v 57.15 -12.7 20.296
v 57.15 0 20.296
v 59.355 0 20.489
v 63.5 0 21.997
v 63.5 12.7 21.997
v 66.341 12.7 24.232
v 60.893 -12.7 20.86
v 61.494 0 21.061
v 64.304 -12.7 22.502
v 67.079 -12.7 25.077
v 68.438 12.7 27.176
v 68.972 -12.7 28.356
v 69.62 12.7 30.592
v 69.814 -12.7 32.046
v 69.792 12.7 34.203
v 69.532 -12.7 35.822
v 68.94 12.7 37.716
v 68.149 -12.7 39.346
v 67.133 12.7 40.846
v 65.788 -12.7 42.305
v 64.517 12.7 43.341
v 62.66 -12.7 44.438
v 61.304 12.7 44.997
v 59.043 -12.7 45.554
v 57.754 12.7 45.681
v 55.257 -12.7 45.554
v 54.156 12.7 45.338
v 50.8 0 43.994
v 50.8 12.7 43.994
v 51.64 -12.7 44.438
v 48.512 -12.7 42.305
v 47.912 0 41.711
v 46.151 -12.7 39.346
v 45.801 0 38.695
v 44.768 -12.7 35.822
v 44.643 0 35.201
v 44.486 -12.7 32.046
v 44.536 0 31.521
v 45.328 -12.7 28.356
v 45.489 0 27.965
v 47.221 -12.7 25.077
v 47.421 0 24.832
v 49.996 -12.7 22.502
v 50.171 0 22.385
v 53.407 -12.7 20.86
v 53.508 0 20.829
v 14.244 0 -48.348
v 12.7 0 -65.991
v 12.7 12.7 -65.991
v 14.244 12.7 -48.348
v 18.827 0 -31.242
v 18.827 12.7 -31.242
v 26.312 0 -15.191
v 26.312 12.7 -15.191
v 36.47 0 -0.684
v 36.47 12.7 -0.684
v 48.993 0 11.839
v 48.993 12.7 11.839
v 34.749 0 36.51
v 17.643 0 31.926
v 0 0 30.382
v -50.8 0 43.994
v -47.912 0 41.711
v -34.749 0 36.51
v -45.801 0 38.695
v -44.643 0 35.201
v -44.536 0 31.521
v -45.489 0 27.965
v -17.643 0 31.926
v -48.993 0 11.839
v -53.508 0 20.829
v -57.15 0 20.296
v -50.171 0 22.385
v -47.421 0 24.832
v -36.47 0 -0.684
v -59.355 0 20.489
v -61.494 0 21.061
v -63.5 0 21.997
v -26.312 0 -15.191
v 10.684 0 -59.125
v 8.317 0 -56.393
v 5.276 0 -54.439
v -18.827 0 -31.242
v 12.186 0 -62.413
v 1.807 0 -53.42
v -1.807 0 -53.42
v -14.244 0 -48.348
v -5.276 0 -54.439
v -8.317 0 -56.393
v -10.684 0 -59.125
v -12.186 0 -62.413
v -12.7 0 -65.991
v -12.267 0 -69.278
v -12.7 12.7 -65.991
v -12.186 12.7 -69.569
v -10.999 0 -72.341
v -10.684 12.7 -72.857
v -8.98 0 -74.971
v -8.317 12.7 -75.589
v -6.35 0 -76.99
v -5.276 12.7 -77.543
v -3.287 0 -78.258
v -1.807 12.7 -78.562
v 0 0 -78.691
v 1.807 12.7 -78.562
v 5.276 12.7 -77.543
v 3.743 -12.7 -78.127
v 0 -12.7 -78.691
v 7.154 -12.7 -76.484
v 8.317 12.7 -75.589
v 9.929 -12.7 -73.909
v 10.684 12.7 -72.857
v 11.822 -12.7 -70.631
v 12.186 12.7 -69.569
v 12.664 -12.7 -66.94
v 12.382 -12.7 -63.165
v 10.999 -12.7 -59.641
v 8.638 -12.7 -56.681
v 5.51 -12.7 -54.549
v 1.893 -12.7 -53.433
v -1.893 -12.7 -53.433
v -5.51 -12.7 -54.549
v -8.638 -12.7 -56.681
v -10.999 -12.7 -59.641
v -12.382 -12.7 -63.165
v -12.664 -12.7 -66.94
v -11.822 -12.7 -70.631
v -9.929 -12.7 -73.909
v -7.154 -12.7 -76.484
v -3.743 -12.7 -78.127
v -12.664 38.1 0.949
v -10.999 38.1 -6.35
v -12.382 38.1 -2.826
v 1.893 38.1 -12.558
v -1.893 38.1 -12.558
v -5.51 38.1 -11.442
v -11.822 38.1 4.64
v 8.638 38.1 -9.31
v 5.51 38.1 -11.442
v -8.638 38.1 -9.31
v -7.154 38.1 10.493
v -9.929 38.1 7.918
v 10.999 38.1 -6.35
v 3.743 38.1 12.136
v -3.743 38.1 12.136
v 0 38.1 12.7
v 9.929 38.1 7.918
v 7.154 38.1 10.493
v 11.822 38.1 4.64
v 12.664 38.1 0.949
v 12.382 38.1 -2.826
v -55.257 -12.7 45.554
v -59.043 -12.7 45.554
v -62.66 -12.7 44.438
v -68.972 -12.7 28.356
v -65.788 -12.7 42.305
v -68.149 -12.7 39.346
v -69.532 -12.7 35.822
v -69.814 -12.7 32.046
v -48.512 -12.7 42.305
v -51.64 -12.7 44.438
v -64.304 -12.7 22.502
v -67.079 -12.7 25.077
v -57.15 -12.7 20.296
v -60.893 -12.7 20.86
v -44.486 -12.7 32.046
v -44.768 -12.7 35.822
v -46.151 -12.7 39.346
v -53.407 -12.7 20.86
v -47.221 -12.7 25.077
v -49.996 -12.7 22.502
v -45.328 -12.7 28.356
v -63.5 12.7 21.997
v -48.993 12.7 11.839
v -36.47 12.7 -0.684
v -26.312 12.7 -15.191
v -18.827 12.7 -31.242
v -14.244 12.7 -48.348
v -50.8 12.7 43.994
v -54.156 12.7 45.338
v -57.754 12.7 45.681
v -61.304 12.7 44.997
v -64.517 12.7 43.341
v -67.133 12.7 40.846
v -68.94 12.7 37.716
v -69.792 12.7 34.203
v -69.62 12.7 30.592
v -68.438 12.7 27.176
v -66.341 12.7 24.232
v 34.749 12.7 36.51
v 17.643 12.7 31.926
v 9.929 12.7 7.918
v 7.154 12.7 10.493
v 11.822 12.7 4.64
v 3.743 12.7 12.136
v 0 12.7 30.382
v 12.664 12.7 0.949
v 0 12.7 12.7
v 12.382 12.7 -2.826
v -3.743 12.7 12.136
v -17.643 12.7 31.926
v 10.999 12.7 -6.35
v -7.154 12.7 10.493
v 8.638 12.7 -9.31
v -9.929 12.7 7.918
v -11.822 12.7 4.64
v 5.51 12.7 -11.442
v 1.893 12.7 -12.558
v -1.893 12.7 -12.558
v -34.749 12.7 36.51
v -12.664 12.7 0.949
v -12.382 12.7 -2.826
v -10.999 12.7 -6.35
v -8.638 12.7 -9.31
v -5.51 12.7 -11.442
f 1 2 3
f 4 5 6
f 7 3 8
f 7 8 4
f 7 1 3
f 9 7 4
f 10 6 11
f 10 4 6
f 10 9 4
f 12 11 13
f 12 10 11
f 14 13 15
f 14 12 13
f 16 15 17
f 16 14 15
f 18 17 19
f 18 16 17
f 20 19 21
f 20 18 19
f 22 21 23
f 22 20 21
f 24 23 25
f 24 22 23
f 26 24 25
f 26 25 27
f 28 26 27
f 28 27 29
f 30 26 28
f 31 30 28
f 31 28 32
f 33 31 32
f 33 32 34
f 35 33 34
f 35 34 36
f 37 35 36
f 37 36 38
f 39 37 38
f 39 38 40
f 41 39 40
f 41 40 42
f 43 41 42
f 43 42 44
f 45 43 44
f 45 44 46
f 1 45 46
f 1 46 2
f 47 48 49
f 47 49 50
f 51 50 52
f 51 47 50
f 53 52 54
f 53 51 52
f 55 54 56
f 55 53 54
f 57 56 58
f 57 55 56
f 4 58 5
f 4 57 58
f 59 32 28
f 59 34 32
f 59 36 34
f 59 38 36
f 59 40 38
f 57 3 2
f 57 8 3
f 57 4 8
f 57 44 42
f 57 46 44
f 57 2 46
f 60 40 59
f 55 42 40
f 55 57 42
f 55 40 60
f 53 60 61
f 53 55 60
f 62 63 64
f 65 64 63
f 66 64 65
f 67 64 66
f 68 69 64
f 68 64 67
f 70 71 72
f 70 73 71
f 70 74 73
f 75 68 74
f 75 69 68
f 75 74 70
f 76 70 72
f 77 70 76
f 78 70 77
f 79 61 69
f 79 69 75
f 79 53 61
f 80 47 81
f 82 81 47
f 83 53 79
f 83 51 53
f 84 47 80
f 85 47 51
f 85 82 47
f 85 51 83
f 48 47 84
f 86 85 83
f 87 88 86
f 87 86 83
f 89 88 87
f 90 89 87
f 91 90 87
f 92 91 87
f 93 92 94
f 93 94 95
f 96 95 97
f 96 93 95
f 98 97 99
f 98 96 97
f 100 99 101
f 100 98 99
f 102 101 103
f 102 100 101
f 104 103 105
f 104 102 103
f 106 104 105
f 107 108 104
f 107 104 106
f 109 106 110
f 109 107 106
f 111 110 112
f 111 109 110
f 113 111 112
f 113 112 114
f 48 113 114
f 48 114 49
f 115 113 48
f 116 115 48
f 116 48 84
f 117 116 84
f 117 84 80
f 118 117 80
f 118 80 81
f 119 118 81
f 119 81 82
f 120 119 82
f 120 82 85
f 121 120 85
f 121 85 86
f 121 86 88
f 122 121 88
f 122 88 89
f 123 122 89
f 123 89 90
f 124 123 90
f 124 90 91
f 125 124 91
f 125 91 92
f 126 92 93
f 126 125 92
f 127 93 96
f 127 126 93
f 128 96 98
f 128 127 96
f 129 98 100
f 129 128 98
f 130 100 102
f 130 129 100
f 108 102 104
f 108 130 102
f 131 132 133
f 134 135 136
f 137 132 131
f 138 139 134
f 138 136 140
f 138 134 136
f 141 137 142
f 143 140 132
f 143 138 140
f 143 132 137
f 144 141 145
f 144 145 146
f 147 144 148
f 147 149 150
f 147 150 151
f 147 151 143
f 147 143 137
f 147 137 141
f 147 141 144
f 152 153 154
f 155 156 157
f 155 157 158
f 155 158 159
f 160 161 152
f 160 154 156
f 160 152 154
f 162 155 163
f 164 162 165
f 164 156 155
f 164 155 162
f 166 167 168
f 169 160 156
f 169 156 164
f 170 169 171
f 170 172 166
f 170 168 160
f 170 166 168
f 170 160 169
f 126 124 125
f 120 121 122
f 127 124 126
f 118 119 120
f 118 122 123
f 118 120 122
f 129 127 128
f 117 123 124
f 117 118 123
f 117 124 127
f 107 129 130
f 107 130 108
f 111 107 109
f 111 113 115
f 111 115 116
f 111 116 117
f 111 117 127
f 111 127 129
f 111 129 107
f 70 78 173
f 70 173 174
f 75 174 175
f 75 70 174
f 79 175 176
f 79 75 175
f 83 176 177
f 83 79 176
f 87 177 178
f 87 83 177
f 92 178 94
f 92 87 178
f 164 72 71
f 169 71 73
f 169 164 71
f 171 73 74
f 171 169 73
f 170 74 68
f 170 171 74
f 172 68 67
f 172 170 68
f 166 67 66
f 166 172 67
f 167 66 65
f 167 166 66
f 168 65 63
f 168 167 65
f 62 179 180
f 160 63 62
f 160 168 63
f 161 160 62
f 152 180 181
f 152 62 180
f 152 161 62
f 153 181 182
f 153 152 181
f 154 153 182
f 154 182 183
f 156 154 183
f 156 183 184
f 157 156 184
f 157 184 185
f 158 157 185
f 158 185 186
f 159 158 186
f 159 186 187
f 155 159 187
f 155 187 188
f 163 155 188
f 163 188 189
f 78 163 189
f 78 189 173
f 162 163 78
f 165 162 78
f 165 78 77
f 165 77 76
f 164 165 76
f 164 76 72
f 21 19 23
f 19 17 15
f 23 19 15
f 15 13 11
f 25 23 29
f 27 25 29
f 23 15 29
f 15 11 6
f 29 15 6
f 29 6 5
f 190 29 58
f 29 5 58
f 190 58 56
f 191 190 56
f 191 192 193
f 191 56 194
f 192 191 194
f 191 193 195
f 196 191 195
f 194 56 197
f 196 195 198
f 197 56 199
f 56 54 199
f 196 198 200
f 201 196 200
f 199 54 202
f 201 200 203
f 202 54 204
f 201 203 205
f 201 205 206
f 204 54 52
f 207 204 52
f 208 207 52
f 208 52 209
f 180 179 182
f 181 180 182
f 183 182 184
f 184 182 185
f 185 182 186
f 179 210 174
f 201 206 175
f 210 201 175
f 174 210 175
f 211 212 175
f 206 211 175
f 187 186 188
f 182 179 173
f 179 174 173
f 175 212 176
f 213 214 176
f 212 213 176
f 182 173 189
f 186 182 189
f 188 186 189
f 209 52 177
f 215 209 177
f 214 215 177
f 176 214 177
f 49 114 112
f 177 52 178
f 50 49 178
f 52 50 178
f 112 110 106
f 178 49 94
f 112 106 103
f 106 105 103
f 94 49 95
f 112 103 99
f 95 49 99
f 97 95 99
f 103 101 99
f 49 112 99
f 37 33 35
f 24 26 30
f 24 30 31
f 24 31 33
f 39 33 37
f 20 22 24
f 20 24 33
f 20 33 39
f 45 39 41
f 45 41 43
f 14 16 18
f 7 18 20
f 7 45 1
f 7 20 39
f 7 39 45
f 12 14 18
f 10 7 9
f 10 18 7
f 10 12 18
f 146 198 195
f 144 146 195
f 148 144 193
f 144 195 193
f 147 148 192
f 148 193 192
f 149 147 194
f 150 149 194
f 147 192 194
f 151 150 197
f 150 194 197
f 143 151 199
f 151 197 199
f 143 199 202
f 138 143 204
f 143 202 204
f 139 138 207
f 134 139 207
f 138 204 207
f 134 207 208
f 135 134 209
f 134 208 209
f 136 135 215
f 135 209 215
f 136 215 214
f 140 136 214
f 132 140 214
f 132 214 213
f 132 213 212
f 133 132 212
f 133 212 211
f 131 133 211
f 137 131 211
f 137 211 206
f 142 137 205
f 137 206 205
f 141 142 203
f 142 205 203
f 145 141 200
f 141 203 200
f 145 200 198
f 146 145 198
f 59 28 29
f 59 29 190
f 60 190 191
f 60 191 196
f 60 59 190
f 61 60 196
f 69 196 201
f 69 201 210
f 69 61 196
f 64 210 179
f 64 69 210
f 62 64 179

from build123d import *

# Parameters (mm, degrees)
BOSS_EXTRUDE1_DEPTH = 12.7
SKETCH2_R           = 12.7
BOSS_EXTRUDE2_DEPTH = 25.4
BOSS_EXTRUDE3_START = 12.7
SKETCH3_R           = 12.7
BOSS_EXTRUDE3_DEPTH = 12.7


with BuildPart() as part:
    # Sketch1 → Boss-Extrude1 (new body)
    with BuildSketch(Plane(origin=(0, 0, 0), x_dir=(1, 0, 0), z_dir=(0, 1, 0))):
        with BuildLine():
            ThreePointArc((-50.8, -43.994090512), (-68.148522628, -39.345567884), (-63.5, -21.997045256))
            ThreePointArc((-63.5, -21.997045256), (-26.311818976, 15.191135768), (-12.7, 65.991135768))
            ThreePointArc((-12.7, 65.991135768), (0, 78.691135768), (12.7, 65.991135768))
            ThreePointArc((12.7, 65.991135768), (26.311818976, 15.191135768), (63.5, -21.997045256))
            ThreePointArc((63.5, -21.997045256), (68.148522628, -39.345567884), (50.8, -43.994090512))
            ThreePointArc((50.8, -43.994090512), (0, -30.382271537), (-50.8, -43.994090512))
        make_face()
    extrude(amount=BOSS_EXTRUDE1_DEPTH)

    # Sketch2 → Boss-Extrude2 (add)
    with BuildSketch(Plane(origin=(0, 12.7, 0), x_dir=(1, 0, 0), z_dir=(0, 1, 0))):
        with Locations(Location((0, 0, 0), (0, 0, 270))):
            Circle(SKETCH2_R)
    extrude(amount=BOSS_EXTRUDE2_DEPTH)

    # Sketch3 → Boss-Extrude3 (add)
    with BuildSketch(Plane.XZ.offset(BOSS_EXTRUDE3_START)):
        with Locations(Location((-57.15, 32.995567884, 0), (0, 0, 270))):
            Circle(SKETCH3_R)
        with Locations(Location((57.15, 32.995567884, 0), (0, 0, 270))):
            Circle(SKETCH3_R)
        with Locations(Location((0, -65.991135768, 0), (0, 0, 270))):
            Circle(SKETCH3_R)
    extrude(amount=-BOSS_EXTRUDE3_DEPTH)


solid = part.part
